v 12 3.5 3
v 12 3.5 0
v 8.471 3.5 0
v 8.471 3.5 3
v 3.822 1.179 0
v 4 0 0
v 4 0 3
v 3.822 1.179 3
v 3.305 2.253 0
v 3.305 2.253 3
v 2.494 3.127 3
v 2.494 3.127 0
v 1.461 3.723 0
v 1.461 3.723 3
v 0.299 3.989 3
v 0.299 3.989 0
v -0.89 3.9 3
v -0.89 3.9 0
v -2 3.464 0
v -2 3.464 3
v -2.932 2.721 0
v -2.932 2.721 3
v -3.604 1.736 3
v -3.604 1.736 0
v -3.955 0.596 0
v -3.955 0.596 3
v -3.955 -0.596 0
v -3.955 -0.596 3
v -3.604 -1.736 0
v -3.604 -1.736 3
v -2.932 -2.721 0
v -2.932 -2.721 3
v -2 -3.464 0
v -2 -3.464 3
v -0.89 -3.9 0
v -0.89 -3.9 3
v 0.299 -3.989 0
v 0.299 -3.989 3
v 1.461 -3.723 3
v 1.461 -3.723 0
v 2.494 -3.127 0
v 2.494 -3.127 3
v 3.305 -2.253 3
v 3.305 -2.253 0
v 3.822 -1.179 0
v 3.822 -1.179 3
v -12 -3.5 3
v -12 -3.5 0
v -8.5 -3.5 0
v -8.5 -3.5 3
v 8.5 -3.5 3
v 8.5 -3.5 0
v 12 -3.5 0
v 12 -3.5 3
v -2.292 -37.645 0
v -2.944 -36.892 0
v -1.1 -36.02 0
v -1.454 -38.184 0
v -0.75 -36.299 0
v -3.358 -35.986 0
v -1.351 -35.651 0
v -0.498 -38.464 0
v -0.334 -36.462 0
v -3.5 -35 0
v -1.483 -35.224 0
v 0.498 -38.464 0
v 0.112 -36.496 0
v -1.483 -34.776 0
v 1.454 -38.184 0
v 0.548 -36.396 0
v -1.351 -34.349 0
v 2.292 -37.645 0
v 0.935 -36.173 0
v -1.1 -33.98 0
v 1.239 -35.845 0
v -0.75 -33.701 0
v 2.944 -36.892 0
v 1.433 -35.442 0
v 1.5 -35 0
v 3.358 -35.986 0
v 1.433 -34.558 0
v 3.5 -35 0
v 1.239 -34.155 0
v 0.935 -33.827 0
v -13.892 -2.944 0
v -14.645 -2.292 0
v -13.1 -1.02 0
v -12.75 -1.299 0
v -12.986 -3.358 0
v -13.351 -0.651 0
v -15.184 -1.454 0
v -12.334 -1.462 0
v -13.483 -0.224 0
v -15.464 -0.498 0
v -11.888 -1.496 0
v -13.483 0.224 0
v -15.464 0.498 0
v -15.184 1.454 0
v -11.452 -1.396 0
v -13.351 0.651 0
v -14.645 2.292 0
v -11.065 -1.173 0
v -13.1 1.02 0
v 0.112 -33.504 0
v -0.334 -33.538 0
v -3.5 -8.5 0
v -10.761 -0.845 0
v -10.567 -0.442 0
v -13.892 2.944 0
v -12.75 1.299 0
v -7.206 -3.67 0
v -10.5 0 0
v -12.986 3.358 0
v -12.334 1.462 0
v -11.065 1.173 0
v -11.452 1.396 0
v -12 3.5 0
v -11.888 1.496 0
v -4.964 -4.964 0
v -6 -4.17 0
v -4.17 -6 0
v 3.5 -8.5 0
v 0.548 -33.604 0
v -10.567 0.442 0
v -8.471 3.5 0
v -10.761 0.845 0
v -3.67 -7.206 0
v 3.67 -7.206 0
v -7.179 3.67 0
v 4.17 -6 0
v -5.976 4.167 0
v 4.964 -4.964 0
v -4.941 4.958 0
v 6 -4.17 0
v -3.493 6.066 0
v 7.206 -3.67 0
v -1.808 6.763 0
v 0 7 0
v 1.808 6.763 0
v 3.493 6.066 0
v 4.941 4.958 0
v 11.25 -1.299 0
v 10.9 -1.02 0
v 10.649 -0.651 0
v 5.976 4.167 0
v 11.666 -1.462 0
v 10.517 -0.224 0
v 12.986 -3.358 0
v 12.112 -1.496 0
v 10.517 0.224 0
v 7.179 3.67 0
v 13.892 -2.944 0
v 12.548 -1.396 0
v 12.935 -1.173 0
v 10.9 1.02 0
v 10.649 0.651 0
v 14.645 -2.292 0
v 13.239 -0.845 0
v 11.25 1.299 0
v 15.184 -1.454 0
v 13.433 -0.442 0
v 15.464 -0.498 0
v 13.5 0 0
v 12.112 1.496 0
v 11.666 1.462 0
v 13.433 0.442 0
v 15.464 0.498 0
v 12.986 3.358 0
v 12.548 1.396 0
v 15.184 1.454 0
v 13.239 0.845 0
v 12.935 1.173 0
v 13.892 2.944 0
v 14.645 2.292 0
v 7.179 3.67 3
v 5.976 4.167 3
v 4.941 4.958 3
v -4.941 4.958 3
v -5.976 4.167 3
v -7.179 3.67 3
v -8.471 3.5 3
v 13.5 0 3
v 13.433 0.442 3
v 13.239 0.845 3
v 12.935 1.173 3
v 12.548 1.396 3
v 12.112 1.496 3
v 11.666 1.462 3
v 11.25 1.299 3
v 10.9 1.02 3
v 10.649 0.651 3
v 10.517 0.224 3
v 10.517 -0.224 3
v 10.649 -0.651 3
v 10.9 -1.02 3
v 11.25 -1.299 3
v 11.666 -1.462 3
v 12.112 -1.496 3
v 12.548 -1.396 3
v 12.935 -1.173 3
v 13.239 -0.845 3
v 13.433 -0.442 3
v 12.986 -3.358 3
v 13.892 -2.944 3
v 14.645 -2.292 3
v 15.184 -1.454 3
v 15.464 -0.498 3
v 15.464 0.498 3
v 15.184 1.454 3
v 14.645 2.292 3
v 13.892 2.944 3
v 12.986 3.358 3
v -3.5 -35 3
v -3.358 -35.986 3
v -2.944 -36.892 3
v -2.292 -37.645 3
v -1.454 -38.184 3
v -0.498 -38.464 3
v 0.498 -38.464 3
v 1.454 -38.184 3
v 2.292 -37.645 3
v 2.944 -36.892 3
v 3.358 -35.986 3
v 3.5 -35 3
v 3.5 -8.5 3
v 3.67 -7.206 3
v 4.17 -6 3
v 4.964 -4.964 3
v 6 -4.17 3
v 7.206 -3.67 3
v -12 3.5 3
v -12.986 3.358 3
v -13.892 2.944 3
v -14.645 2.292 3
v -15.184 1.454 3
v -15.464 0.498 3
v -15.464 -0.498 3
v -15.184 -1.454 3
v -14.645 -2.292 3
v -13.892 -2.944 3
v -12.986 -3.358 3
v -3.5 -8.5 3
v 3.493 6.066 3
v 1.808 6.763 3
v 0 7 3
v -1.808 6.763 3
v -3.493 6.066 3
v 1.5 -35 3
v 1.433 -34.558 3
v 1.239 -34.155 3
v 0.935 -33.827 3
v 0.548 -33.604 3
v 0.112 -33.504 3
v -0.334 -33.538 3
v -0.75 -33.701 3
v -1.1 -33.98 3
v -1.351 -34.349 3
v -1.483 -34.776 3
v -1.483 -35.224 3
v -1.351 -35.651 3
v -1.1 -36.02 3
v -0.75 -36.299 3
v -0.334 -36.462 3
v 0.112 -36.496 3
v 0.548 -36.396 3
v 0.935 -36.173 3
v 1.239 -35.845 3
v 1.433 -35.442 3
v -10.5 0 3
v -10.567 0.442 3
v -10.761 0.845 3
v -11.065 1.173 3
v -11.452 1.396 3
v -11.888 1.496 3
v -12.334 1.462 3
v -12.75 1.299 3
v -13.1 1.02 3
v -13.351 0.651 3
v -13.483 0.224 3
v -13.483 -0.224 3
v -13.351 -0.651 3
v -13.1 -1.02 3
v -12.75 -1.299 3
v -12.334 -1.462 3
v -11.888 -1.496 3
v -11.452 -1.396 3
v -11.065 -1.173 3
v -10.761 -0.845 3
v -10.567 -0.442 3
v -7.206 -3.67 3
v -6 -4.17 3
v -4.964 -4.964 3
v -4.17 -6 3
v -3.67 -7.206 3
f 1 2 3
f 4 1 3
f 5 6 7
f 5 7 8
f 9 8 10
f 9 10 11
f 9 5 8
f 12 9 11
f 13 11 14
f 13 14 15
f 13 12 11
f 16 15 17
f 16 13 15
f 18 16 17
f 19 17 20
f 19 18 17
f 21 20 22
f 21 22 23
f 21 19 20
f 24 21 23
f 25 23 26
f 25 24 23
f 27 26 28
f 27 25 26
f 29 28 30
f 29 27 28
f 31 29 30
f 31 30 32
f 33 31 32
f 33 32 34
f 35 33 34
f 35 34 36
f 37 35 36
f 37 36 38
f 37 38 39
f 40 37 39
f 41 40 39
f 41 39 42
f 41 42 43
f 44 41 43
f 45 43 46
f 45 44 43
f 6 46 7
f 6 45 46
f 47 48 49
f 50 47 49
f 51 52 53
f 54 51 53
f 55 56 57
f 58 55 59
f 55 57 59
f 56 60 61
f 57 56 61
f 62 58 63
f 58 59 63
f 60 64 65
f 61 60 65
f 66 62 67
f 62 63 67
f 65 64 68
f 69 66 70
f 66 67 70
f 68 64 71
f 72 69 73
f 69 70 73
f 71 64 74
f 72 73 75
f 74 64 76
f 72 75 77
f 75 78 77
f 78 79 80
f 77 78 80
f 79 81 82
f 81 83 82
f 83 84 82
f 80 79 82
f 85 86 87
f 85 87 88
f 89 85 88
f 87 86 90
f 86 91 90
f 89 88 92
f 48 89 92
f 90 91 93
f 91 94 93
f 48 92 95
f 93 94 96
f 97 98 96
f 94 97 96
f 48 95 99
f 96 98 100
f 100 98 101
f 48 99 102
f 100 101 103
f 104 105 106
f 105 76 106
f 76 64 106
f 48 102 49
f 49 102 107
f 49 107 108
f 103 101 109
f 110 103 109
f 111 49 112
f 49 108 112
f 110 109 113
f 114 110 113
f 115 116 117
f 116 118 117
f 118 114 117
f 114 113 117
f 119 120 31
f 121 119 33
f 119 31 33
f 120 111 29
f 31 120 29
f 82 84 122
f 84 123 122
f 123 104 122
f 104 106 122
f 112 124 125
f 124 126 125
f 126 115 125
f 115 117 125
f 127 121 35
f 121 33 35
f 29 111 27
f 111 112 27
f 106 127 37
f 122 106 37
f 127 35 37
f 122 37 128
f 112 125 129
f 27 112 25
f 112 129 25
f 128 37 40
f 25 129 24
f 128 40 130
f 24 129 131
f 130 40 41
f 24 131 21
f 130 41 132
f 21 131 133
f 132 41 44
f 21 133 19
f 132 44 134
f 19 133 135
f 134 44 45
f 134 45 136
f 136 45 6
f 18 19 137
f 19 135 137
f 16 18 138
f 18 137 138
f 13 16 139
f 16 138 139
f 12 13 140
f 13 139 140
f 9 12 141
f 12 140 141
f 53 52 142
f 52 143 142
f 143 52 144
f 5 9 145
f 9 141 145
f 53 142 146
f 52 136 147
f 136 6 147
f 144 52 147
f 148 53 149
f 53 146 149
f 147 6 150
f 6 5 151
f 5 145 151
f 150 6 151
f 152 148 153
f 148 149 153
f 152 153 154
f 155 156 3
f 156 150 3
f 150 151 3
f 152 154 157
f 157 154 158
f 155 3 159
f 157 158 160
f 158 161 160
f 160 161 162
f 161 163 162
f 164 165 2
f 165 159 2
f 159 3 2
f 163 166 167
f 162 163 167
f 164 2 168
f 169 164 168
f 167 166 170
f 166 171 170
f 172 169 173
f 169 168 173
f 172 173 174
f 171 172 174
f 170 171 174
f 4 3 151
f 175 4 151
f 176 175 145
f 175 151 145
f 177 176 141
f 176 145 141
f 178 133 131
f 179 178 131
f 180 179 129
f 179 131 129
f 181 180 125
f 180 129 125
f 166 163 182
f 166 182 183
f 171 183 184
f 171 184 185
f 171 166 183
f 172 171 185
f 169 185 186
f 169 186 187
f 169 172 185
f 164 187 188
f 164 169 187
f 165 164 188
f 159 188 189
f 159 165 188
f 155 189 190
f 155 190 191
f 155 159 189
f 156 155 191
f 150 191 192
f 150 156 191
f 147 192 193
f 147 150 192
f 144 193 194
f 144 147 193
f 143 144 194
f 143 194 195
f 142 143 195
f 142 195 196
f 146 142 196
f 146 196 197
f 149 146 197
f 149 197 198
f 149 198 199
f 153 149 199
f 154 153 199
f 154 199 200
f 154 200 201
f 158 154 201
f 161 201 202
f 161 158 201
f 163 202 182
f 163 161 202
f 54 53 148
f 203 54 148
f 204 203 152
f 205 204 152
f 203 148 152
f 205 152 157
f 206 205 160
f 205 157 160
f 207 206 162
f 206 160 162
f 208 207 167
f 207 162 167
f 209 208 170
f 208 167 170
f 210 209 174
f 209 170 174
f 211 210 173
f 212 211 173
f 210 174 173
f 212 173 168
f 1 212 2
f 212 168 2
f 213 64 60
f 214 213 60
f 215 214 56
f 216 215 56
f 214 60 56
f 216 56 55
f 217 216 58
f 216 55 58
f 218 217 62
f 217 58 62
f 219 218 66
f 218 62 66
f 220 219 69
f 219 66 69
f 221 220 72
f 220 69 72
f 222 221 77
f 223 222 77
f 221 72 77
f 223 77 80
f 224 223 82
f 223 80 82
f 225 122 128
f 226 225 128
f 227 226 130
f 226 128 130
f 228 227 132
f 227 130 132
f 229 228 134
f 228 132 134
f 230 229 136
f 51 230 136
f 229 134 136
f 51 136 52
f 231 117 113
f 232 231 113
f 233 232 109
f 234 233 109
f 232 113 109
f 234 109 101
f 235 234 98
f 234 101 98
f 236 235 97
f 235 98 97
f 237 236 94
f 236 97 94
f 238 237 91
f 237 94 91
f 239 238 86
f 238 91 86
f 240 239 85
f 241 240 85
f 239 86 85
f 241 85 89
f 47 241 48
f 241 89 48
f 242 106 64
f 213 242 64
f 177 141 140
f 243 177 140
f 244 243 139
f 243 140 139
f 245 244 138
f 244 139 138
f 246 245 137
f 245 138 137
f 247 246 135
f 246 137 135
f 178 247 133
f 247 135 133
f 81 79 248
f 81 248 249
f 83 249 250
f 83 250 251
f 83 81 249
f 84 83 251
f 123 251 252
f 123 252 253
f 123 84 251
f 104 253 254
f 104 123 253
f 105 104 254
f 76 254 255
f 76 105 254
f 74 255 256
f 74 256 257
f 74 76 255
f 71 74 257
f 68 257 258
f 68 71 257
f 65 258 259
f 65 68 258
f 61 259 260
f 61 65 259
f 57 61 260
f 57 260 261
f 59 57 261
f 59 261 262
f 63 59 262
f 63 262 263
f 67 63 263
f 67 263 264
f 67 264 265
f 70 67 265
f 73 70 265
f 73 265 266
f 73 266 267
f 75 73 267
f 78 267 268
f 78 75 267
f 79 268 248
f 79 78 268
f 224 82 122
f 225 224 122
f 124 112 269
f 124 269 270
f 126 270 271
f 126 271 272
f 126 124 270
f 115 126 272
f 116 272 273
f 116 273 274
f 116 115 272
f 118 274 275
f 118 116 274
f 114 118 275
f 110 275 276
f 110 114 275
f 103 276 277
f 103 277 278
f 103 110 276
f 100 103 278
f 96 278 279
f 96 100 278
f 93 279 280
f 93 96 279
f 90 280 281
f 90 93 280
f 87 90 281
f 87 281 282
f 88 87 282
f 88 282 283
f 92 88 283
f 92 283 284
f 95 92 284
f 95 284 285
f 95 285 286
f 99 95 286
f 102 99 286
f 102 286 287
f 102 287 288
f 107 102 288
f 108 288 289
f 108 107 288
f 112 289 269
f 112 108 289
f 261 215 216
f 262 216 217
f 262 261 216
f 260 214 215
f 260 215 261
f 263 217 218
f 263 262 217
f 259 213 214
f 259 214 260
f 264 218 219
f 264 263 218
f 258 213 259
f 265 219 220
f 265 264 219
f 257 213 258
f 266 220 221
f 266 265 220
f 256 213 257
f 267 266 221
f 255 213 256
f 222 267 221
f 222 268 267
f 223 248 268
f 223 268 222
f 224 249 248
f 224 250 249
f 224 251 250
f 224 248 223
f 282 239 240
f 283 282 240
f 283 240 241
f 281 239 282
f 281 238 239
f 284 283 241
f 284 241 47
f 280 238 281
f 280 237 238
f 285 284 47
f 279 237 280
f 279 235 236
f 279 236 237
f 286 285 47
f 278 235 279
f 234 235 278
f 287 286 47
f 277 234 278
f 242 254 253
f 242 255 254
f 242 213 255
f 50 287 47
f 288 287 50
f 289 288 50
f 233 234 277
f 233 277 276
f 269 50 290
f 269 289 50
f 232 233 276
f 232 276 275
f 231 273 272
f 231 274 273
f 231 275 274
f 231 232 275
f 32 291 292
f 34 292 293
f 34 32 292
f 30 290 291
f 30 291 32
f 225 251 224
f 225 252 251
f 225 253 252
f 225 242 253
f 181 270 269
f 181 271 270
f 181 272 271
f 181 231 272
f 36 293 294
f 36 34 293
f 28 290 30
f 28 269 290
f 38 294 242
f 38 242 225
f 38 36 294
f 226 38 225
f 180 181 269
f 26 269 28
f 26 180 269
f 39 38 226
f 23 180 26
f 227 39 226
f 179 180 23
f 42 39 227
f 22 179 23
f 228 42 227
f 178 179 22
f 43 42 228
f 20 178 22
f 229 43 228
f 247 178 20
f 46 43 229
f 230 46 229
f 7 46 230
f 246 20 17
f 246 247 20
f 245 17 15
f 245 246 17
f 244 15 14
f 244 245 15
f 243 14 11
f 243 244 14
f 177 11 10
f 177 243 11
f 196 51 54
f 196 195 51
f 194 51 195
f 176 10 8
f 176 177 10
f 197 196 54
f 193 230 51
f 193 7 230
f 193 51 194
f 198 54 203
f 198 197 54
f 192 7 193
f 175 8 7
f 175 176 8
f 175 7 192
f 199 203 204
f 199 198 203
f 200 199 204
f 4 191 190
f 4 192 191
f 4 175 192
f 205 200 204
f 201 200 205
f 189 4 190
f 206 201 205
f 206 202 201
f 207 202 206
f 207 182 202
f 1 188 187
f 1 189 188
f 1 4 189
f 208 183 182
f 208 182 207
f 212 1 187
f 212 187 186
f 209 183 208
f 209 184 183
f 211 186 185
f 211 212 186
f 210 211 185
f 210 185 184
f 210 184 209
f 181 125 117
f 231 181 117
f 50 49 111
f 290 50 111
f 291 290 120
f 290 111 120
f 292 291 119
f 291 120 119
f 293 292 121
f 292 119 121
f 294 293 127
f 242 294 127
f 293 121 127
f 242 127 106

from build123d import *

# Parameters (mm, degrees)
SKETCH_1_R      = 4
SKETCH_1_R_2    = 1.5
EXTRUDE_1_DEPTH = 3


with BuildPart() as part:
    # 草图1 → 凸台-拉伸1 (new body)
    with BuildSketch(Plane.XY):
        with BuildLine():
            Line((-12, -3.5), (-8.5, -3.5))
            ThreePointArc((-8.5, -3.5), (-4.964466094, -4.964466094), (-3.5, -8.5))
            Line((-3.5, -8.5), (-3.5, -35))
            ThreePointArc((-3.5, -35), (0, -38.5), (3.5, -35))
            Line((3.5, -35), (3.5, -8.5))
            ThreePointArc((3.5, -8.5), (4.964466094, -4.964466094), (8.5, -3.5))
            Line((8.5, -3.5), (12, -3.5))
            ThreePointArc((12, -3.5), (15.5, 0), (12, 3.5))
            Line((12, 3.5), (8.470537173, 3.5))
            ThreePointArc((8.470537173, 3.5), (6.561130633, 3.878943122), (4.941146684, 4.958333333))
            ThreePointArc((4.941146684, 4.958333333), (0, 7), (-4.941146684, 4.958333333))
            ThreePointArc((-4.941146684, 4.958333333), (-6.561130633, 3.878943122), (-8.470537173, 3.5))
            Line((-8.470537173, 3.5), (-12, 3.5))
            ThreePointArc((-12, 3.5), (-15.5, 0), (-12, -3.5))
        make_face()
        Circle(SKETCH_1_R, mode=Mode.SUBTRACT)
        with Locations((-12, 0)):
            Circle(SKETCH_1_R_2, mode=Mode.SUBTRACT)
        with Locations((0, -35)):
            Circle(SKETCH_1_R_2, mode=Mode.SUBTRACT)
        with Locations((12, 0)):
            Circle(SKETCH_1_R_2, mode=Mode.SUBTRACT)
    extrude(amount=EXTRUDE_1_DEPTH)


solid = part.part
